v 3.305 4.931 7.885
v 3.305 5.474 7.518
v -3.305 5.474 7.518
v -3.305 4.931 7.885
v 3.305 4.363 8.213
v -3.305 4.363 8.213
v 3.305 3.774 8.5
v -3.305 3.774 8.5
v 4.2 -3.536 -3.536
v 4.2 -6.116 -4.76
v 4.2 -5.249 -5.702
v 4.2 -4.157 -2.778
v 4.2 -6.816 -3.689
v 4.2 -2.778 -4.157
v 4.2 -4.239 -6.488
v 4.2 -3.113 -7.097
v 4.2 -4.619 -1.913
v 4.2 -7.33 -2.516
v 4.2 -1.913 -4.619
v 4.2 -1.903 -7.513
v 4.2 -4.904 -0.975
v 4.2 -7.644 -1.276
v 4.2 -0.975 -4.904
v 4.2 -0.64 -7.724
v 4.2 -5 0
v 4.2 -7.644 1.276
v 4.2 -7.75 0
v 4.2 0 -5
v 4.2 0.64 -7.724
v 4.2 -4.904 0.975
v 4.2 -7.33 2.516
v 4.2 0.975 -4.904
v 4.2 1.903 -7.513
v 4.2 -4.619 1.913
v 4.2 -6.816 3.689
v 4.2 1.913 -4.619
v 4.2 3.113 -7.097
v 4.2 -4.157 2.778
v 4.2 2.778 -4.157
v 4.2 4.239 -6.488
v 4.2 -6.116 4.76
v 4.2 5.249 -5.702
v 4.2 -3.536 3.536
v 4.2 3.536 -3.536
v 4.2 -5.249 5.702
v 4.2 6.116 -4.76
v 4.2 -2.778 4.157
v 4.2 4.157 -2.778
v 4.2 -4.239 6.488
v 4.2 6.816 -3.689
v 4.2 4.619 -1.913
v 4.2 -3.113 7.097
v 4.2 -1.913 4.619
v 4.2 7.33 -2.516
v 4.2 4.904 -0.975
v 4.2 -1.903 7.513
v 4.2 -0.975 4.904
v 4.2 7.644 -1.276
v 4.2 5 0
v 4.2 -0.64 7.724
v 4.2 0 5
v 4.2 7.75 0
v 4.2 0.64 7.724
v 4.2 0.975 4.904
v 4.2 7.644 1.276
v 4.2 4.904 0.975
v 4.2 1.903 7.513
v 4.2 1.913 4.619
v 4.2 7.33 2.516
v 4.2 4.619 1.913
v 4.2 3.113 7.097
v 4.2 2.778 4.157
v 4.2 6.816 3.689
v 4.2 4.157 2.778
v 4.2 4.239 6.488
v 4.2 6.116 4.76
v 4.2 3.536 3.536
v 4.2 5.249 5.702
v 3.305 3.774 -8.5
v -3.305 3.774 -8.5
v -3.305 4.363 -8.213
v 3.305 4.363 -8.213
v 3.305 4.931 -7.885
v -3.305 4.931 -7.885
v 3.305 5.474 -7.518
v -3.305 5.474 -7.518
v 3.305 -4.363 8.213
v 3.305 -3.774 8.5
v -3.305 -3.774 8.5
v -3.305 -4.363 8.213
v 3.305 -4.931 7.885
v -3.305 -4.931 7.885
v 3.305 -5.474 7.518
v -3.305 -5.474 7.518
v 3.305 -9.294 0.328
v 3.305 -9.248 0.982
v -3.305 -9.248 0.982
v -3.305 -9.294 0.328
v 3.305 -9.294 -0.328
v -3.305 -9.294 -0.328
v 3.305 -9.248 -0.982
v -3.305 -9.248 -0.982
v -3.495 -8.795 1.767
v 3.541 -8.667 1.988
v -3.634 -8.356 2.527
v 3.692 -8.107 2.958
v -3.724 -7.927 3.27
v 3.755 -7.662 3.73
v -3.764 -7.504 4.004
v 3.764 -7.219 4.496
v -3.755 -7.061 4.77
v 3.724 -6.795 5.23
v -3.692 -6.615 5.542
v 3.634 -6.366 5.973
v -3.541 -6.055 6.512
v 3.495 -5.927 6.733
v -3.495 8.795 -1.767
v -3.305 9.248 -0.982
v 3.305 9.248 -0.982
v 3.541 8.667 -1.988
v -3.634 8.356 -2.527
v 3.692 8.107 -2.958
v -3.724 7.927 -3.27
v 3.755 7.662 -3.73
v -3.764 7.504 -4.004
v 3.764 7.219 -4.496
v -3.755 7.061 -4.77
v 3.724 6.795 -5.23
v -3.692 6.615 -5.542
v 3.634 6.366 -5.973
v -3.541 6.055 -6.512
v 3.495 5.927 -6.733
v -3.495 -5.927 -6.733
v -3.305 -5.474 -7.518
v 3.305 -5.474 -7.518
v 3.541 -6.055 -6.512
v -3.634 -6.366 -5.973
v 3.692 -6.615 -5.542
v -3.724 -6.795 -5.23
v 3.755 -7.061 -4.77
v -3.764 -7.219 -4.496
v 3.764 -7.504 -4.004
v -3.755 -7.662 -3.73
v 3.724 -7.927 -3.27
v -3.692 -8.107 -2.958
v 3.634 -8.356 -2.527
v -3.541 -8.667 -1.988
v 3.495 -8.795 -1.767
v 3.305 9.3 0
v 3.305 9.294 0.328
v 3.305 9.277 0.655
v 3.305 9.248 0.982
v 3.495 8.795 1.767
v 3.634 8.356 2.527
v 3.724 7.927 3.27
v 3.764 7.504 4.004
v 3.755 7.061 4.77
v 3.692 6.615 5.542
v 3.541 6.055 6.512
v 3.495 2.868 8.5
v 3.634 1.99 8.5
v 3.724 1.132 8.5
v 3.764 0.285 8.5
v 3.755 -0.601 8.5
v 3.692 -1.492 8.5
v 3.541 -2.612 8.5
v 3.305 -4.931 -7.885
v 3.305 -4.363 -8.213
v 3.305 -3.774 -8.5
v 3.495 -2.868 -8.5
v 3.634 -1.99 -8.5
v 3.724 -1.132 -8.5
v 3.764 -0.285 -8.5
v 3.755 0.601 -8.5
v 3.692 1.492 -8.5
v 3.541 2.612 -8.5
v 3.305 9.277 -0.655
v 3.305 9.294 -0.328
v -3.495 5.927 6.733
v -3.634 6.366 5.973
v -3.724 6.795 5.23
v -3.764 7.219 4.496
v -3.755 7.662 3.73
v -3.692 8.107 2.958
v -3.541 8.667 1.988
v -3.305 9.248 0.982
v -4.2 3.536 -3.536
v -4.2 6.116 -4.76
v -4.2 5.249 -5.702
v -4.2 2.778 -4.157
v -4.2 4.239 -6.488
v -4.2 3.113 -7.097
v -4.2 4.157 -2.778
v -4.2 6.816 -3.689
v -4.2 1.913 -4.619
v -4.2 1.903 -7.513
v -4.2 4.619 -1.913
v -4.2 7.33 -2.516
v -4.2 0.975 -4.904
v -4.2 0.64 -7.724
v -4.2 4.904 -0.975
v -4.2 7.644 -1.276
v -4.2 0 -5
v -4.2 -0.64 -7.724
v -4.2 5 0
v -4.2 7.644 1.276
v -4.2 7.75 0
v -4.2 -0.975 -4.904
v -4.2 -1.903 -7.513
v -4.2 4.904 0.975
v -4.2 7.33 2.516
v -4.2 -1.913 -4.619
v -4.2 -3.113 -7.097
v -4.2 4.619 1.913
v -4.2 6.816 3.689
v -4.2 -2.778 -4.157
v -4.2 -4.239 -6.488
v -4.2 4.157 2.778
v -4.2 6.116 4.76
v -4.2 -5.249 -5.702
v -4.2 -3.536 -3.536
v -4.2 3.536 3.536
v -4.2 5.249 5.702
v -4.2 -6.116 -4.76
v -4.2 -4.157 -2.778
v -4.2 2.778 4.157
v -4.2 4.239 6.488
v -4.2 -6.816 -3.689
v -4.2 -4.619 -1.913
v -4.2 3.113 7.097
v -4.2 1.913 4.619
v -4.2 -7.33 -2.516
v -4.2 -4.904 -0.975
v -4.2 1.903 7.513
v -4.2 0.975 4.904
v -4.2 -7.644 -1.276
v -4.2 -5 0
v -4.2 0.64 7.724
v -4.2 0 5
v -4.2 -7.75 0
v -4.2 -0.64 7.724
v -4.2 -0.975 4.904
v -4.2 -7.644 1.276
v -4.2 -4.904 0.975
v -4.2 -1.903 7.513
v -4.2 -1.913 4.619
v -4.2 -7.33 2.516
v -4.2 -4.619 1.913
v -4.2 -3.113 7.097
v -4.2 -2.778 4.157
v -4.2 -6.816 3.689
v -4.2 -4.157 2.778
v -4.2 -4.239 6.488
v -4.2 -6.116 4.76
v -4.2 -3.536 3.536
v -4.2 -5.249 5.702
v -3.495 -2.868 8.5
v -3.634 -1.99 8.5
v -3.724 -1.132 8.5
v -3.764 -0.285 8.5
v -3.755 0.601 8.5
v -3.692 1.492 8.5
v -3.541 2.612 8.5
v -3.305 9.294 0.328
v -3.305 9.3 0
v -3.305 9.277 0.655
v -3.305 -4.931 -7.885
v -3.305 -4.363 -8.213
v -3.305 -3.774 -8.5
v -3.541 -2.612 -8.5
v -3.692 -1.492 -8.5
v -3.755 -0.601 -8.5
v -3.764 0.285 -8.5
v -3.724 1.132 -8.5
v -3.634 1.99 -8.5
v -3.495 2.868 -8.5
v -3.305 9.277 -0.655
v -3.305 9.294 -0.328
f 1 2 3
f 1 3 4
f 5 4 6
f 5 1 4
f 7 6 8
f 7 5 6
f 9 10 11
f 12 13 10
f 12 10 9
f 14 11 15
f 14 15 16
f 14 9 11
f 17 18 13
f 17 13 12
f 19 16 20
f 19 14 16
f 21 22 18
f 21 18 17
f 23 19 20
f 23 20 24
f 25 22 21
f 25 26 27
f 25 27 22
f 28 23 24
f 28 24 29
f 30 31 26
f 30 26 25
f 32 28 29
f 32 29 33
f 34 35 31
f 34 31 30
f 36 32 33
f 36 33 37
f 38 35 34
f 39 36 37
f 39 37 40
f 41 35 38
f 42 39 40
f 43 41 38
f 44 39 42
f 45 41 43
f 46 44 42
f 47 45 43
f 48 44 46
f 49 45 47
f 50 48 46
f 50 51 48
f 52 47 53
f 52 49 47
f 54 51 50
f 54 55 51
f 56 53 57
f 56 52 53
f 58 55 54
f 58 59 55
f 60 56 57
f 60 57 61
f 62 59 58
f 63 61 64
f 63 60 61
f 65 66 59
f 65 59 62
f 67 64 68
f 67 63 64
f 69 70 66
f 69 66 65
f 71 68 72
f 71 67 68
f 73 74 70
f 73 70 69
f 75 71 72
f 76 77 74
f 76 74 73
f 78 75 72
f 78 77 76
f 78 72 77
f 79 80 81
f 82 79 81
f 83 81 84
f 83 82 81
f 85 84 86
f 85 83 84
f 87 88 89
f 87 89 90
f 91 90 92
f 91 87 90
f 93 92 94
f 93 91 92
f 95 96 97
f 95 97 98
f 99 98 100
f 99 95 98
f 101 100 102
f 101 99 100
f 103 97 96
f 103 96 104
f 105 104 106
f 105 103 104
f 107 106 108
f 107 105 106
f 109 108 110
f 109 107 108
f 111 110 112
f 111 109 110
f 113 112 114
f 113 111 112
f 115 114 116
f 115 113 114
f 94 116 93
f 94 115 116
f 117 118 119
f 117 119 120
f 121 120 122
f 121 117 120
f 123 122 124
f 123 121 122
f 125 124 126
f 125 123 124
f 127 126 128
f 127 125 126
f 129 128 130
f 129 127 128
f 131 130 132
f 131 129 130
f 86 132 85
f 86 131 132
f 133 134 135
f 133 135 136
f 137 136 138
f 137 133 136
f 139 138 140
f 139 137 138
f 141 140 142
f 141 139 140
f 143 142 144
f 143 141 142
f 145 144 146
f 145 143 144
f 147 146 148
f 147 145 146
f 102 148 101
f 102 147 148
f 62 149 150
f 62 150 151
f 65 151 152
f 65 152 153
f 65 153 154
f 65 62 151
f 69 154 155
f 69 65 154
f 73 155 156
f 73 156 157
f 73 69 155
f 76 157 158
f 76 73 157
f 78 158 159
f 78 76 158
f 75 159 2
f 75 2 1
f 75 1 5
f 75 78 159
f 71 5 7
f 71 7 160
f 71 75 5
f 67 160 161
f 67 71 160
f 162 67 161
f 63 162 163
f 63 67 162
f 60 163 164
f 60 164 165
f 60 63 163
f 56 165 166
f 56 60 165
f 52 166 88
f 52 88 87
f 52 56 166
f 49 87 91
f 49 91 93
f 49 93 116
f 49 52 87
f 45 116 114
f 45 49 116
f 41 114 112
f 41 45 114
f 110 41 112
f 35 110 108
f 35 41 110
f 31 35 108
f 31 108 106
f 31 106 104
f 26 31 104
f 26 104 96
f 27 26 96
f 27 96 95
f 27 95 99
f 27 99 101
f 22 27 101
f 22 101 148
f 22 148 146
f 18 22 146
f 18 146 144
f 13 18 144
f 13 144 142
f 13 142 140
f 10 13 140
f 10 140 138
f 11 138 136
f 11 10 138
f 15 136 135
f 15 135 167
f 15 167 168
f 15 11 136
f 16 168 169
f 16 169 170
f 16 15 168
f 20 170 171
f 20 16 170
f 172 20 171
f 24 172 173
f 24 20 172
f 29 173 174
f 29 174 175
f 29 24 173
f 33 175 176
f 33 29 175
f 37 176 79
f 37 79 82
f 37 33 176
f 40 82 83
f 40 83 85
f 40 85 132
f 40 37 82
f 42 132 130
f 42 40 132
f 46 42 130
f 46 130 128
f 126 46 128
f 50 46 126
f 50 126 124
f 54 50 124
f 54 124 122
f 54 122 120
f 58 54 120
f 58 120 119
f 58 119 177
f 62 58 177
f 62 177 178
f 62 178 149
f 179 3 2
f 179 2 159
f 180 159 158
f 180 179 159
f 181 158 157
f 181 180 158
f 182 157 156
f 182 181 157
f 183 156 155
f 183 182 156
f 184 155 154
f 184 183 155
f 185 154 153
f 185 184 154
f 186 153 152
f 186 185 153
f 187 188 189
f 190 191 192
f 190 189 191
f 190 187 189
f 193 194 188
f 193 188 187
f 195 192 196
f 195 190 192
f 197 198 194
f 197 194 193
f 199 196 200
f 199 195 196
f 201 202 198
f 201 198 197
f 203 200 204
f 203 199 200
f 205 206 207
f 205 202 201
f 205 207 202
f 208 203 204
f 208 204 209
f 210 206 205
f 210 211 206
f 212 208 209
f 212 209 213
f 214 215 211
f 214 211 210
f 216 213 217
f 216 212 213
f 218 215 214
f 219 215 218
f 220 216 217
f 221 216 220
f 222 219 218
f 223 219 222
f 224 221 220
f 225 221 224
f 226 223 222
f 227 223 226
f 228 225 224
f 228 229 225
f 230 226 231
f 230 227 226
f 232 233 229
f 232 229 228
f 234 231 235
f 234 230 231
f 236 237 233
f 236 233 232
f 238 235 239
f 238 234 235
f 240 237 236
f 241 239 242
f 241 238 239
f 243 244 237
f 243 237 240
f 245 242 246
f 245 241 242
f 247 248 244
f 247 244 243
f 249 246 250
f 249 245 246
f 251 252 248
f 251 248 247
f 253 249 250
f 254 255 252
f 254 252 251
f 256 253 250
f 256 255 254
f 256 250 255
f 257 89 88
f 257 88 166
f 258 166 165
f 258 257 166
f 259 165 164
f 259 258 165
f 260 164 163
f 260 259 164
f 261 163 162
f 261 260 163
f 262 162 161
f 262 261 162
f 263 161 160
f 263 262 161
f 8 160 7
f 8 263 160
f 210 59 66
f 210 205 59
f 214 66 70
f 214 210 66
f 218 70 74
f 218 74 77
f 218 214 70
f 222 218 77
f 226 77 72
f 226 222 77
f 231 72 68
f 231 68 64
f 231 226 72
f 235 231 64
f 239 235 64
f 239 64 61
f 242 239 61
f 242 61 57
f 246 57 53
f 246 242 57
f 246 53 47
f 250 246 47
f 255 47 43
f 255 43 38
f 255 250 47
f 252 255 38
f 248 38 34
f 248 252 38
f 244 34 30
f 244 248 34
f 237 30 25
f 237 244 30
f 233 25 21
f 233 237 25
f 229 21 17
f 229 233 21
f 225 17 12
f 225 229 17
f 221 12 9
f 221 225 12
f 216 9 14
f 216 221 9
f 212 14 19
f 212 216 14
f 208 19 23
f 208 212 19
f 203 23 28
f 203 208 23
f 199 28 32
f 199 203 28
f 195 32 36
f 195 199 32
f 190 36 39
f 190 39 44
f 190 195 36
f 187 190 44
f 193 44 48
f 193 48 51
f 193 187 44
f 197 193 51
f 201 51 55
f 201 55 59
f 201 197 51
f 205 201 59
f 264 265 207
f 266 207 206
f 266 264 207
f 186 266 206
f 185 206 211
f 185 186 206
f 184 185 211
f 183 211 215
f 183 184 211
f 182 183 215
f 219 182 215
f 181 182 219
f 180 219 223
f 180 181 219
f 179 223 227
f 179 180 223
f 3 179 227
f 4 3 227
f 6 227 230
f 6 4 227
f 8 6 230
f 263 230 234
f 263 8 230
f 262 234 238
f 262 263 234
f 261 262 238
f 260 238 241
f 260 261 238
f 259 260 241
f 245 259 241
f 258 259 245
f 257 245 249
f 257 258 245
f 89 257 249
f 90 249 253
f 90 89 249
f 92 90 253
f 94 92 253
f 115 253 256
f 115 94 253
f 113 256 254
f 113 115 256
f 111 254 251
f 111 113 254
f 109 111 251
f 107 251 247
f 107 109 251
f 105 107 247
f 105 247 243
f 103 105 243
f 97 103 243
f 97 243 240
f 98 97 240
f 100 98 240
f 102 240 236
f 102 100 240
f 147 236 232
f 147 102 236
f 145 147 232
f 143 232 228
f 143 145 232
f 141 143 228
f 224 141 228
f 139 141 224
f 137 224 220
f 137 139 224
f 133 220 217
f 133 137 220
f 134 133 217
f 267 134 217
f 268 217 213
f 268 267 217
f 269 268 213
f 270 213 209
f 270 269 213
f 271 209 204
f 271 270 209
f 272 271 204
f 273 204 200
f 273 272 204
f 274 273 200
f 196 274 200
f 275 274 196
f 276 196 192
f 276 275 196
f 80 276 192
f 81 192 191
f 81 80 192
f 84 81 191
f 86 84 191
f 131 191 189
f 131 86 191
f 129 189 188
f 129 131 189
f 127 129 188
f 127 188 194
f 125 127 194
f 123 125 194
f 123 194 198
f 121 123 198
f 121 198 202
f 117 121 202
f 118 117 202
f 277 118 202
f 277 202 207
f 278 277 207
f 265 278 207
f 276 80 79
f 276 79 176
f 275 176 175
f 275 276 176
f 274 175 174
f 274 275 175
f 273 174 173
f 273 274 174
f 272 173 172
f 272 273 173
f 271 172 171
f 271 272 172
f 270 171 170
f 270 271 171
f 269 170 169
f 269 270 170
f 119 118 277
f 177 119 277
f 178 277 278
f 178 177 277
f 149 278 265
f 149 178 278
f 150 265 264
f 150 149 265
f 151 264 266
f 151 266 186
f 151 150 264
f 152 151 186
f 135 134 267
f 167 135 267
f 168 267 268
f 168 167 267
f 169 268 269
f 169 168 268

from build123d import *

# Parameters (mm, degrees)
SKETCH_2_OUTSIDE_W  = 26.122
SKETCH_2_OUTSIDE_H  = 26.122
CUT_EXTRUDE_1_DEPTH = 9.4


with BuildPart() as part:
    # Эскиз1 → Повернуть1 (revolve)
    with BuildSketch(Plane.XY):
        Polygon((4.2, 5), (-4.2, 5), (-4.2, 7.75), (-3.305107083, 9.3), (3.305107083, 9.3), (4.2, 7.75), align=None)
    revolve(axis=Axis((-345.378129483, 0, 0), (1, 0, 0)))

    # Эскиз2 outside → Вырез-Вытянуть1 (cut, through all)
    with BuildSketch(Plane.ZY.offset(4.2)):
        Rectangle(SKETCH_2_OUTSIDE_W, SKETCH_2_OUTSIDE_H)
        Polygon((0, -9.814954576), (8.5, -4.907477288), (8.5, 4.907477288), (0, 9.814954576), (-8.5, 4.907477288), (-8.5, -4.907477288), align=None, mode=Mode.SUBTRACT)
    extrude(amount=-CUT_EXTRUDE_1_DEPTH, mode=Mode.SUBTRACT)


solid = part.part
